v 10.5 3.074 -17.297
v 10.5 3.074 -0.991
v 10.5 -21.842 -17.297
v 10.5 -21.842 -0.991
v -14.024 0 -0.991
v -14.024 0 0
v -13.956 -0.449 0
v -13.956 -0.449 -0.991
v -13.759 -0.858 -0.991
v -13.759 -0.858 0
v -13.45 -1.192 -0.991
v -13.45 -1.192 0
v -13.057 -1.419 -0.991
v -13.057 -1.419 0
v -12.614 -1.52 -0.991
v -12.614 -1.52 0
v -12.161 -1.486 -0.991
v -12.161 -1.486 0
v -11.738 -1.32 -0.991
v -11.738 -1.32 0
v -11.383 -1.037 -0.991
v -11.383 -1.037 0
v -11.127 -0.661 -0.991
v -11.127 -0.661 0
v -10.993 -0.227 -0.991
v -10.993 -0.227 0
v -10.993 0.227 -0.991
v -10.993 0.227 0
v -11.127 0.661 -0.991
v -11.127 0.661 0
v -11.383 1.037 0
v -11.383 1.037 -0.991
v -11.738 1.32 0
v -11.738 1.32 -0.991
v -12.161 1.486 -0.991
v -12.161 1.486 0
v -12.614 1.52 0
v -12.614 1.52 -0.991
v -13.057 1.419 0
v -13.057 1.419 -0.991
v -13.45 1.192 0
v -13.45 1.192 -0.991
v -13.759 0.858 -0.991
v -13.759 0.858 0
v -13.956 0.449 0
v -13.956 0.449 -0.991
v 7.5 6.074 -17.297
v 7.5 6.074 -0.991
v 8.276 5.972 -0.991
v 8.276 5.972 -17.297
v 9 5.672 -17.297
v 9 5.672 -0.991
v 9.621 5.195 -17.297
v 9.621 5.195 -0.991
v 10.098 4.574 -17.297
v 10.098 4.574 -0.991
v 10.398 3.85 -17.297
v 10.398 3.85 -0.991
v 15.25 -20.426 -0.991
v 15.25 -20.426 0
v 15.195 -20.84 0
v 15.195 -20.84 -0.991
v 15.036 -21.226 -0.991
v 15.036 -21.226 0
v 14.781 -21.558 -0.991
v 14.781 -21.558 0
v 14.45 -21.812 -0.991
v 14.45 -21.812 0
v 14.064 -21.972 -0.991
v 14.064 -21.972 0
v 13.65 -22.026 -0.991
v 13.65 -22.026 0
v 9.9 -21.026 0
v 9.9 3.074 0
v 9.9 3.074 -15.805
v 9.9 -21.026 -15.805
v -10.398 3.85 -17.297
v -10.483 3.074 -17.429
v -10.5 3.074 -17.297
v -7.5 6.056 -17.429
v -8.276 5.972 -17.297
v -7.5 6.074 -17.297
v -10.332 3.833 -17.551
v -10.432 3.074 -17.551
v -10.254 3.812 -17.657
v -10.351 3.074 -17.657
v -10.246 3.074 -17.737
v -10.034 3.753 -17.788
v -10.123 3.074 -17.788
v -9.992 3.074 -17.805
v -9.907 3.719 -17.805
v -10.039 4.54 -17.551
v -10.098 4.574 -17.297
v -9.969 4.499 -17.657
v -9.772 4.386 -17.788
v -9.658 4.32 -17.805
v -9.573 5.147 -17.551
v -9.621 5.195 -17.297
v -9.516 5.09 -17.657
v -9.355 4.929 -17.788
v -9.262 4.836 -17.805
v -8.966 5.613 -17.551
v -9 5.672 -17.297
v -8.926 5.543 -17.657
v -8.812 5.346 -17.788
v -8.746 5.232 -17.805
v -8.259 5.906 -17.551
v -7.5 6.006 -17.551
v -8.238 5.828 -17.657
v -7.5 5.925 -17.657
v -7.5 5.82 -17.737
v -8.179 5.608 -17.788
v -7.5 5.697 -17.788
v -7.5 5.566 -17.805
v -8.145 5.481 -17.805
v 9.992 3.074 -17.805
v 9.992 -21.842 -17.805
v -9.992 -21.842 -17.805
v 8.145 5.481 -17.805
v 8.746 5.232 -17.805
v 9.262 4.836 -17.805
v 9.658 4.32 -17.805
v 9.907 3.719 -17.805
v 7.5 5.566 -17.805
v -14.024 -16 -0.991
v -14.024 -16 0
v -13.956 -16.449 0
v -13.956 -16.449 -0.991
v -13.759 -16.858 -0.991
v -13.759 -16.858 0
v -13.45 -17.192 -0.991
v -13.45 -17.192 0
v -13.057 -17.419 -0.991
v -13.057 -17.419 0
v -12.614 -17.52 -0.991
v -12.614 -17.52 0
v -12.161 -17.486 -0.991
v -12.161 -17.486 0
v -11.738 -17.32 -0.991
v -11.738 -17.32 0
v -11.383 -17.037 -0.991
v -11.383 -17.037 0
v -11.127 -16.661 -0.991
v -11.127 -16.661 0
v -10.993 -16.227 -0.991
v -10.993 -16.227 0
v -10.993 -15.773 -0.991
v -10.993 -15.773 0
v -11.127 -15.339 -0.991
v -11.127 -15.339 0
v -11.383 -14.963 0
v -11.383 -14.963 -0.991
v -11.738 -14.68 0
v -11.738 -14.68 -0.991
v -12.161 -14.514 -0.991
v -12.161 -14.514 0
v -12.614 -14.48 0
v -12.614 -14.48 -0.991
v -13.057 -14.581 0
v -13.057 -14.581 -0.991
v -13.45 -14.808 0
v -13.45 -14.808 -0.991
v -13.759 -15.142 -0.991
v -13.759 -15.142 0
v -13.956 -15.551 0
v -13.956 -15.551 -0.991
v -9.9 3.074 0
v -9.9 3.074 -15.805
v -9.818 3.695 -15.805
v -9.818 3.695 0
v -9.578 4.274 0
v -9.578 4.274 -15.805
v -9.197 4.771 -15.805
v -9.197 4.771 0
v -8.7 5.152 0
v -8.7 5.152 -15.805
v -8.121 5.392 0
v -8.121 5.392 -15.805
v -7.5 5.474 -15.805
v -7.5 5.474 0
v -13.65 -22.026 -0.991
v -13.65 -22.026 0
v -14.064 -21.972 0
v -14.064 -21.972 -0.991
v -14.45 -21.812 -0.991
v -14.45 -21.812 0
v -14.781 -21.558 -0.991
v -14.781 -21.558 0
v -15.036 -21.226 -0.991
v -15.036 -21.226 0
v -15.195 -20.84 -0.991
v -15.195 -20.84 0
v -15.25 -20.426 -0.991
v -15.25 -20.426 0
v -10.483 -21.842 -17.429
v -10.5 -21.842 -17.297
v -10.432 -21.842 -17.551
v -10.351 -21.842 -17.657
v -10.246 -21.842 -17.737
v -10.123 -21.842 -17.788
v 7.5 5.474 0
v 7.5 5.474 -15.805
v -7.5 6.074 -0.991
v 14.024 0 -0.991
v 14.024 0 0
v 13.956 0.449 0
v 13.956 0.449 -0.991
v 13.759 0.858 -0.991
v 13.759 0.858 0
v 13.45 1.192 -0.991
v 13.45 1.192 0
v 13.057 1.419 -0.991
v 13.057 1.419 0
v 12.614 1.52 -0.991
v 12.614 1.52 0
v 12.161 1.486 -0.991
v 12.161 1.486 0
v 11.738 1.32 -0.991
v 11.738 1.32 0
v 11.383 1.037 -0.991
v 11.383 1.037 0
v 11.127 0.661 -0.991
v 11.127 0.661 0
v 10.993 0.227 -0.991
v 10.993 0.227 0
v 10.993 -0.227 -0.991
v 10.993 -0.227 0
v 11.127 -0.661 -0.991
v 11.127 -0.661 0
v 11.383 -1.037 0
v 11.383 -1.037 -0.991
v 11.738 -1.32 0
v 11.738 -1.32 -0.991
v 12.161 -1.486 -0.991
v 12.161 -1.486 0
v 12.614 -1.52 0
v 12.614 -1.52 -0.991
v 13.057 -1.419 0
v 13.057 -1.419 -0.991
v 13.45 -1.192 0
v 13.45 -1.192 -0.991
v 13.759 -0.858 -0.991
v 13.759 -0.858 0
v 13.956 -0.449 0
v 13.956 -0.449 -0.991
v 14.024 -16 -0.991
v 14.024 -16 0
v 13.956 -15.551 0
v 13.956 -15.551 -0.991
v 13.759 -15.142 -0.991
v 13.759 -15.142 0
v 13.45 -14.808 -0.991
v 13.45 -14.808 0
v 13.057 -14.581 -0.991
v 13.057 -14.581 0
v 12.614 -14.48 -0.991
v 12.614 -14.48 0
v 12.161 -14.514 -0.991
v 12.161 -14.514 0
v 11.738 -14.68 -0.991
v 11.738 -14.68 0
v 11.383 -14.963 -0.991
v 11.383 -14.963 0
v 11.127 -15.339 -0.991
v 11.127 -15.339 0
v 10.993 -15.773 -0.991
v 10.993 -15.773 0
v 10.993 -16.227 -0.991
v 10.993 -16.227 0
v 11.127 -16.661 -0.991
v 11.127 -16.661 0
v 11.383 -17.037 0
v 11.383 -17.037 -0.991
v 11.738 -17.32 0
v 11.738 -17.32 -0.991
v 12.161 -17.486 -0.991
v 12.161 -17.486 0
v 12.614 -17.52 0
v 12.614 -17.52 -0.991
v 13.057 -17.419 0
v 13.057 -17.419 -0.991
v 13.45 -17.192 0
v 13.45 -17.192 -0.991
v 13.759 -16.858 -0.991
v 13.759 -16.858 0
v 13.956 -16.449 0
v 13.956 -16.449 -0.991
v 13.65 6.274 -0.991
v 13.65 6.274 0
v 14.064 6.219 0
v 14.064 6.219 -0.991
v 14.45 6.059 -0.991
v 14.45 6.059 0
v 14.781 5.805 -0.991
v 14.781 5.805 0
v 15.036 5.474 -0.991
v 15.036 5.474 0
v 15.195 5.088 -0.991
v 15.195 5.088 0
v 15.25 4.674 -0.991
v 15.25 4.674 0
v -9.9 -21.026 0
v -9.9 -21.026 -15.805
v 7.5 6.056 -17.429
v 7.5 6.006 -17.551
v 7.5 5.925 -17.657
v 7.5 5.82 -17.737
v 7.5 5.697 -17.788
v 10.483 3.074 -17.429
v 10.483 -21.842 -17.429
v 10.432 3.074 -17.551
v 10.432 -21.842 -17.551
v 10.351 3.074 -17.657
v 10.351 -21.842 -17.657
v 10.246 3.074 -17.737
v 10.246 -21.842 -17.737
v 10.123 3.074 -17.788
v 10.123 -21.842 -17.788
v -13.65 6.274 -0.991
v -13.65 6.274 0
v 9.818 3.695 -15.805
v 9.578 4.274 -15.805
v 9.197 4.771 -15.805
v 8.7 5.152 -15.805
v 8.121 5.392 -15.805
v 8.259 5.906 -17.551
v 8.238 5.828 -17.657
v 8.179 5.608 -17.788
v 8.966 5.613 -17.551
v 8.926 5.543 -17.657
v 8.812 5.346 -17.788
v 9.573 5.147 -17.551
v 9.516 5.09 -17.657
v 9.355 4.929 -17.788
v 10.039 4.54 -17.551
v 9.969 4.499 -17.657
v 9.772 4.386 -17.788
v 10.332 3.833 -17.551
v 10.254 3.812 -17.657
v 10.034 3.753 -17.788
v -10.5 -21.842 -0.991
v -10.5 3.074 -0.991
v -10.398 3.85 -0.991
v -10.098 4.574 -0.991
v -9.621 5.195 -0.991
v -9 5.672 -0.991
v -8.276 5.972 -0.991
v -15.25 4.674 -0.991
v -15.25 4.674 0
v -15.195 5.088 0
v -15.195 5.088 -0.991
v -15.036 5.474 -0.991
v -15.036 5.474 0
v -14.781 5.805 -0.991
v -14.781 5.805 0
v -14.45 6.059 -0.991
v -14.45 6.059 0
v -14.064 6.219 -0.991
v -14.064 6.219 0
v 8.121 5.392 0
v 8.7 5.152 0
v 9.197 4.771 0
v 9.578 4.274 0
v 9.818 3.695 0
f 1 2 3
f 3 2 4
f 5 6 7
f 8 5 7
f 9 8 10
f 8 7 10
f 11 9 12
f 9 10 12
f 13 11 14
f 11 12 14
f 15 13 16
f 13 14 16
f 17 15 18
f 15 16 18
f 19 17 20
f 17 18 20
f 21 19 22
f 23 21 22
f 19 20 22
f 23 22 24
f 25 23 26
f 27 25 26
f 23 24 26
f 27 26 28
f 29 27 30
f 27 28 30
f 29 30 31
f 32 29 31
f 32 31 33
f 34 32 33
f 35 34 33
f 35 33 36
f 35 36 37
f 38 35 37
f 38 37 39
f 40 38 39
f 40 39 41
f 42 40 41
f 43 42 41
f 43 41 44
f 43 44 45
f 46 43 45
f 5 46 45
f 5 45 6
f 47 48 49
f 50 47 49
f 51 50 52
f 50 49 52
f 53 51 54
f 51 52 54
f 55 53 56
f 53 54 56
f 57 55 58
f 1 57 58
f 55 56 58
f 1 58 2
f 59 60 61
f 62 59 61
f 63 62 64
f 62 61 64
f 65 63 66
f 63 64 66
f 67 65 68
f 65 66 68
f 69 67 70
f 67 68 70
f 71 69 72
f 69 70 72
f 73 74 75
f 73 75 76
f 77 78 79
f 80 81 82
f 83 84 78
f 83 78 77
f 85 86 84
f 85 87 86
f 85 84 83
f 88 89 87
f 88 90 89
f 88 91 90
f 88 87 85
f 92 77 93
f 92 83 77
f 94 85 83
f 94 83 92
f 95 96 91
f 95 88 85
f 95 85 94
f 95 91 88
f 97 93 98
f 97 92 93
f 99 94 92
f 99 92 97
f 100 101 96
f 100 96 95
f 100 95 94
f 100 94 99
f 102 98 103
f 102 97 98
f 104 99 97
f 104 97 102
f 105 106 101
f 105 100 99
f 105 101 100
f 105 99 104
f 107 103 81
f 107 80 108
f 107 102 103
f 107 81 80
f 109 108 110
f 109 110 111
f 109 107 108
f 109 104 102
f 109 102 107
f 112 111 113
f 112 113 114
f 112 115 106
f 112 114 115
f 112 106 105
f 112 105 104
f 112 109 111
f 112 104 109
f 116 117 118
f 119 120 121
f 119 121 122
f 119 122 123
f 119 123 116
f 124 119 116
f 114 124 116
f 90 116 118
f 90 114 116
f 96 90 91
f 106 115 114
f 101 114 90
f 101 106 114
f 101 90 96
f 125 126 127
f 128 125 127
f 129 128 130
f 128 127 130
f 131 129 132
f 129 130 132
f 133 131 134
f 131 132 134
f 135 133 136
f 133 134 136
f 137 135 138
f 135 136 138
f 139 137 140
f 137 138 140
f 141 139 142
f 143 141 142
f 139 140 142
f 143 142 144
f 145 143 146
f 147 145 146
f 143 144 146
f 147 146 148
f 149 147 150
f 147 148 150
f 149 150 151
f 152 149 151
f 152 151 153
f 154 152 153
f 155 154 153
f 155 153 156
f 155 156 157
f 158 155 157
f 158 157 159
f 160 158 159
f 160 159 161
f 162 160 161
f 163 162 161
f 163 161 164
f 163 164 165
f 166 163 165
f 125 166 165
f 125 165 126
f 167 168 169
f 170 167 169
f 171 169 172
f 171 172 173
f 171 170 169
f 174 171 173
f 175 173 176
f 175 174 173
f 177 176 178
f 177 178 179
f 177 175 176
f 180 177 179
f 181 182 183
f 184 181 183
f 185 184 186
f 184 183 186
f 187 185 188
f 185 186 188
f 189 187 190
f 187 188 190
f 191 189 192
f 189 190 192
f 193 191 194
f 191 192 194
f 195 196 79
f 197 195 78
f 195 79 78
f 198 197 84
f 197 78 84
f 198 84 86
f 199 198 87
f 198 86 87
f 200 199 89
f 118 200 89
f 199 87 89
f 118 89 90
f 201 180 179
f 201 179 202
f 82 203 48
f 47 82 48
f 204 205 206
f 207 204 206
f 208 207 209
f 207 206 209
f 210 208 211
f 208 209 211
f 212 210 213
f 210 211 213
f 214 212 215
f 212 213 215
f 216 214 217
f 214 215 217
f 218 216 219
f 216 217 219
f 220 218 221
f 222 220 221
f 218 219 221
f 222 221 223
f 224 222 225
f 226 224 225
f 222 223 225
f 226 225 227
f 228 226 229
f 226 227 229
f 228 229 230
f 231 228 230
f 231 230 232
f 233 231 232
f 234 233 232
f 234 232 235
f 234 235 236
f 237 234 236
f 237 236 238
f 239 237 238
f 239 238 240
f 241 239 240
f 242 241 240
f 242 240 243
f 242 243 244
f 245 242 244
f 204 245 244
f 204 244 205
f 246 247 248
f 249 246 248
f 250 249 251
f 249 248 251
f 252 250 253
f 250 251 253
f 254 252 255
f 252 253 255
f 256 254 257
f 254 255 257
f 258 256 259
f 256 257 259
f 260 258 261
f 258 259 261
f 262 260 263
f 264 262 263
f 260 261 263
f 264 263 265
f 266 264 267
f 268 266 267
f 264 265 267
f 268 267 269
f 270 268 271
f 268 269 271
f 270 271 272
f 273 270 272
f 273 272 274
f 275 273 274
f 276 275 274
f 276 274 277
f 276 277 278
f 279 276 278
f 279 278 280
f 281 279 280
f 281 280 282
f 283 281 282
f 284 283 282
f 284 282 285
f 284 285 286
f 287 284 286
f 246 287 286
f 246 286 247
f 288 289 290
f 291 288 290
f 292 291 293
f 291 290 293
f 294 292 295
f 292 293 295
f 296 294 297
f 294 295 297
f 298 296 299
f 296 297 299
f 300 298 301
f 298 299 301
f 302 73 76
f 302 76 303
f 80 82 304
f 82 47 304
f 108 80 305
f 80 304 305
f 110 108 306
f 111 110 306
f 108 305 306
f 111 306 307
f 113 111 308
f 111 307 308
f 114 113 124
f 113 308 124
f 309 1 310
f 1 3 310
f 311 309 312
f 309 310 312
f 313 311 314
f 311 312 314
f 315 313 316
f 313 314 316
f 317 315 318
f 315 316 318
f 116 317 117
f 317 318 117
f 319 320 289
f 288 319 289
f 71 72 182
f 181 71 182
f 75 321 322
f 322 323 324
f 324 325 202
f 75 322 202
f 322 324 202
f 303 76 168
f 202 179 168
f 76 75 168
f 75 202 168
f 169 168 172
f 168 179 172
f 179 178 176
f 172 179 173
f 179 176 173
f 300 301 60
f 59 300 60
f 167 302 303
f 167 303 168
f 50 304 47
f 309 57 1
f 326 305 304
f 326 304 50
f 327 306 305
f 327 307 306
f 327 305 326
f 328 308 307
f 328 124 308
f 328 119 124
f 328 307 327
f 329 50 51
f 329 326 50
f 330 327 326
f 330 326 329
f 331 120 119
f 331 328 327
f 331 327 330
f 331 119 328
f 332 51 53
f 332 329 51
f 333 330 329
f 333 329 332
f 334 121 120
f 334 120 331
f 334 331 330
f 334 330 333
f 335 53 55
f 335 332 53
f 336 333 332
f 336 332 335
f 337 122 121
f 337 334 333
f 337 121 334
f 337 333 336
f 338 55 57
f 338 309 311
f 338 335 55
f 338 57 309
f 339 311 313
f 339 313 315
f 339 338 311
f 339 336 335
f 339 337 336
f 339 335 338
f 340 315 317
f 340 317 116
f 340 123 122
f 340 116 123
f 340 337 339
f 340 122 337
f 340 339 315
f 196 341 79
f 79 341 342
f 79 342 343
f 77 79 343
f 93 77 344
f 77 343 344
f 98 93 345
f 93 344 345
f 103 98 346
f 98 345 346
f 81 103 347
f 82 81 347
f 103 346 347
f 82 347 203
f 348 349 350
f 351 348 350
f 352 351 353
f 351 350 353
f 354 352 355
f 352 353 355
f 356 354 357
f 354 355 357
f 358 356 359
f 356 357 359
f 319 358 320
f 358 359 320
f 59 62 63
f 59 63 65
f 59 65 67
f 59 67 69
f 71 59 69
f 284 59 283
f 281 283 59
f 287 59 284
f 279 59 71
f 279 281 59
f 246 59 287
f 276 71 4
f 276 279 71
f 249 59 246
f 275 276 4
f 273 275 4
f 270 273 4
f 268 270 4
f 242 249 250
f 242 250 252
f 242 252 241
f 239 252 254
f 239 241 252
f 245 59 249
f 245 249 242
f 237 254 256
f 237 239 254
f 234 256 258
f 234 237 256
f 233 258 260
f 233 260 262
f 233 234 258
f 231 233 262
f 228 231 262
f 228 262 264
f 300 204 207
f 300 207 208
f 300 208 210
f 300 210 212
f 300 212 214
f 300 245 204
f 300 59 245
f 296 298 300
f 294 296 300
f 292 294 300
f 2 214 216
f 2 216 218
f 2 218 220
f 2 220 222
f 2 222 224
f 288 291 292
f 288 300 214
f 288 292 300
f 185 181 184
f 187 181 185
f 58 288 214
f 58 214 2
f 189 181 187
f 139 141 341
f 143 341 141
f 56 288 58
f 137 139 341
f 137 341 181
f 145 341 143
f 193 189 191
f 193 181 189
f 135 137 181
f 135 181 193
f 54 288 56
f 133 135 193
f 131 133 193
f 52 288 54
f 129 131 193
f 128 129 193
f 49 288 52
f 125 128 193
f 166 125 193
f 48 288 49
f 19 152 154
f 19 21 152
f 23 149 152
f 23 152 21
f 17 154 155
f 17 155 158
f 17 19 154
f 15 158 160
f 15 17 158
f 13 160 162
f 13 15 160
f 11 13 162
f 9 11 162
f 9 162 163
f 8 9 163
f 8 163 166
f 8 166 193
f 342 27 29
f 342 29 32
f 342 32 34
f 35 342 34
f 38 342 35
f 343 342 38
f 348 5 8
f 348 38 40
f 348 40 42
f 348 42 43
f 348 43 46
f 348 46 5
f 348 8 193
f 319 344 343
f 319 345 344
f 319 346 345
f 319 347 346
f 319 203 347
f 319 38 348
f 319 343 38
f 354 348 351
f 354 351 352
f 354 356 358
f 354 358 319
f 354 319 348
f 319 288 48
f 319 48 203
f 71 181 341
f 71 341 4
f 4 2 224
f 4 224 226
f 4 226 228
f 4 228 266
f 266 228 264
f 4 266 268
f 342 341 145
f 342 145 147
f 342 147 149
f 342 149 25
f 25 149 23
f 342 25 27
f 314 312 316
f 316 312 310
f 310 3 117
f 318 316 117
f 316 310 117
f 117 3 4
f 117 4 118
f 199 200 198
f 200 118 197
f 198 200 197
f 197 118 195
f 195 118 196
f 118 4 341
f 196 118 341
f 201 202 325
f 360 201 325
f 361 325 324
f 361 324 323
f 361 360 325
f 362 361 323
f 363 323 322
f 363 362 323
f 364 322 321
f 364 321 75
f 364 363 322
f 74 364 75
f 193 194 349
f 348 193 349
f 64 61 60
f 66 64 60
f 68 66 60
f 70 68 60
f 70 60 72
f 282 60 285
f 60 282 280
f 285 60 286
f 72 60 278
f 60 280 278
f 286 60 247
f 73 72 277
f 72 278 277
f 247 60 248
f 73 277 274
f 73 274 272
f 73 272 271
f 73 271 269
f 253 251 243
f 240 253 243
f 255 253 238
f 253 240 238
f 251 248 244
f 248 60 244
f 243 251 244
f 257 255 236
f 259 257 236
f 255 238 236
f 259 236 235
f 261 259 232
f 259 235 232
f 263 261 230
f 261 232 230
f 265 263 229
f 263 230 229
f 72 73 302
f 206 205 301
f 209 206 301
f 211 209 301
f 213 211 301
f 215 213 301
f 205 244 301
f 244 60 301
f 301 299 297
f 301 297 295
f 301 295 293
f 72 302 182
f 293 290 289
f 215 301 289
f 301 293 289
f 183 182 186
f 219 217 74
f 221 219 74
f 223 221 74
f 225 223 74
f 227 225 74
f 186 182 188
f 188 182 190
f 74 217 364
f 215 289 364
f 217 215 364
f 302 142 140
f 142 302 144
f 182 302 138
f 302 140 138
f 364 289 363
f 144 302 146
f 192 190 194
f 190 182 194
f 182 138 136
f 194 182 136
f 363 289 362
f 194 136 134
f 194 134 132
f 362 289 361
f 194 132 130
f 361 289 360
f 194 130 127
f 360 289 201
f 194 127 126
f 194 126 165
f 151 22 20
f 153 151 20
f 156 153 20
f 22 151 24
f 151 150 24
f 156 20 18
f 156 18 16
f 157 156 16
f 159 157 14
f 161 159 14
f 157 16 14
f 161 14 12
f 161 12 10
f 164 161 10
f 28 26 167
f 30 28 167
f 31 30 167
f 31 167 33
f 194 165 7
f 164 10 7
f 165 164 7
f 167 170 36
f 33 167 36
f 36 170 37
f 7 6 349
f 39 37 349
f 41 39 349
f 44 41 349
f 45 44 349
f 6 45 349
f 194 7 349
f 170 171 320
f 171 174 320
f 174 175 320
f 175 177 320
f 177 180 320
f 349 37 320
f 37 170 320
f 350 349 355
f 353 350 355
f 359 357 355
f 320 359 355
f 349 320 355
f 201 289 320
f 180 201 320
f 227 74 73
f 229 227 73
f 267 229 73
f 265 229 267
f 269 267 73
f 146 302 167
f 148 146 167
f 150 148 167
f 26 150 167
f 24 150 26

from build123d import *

# Parameters (mm, degrees)
BASE_EXTRUDE_DEPTH  = 0.9906
SKETCH8_R           = 1.524
CUT_EXTRUDE4_DEPTH  = 27.808529889
BOSS_EXTRUDE5_DEPTH = 16.8148
FILLET3_R           = 0.508
CUT_EXTRUDE5_DEPTH  = 15.8054
LPATTERN1_COUNT     = 2
LPATTERN1_PITCH     = 16


with BuildPart() as part:
    # Sketch1 → Base-Extrude (new body)
    with BuildSketch(Plane.XY):
        with BuildLine():
            Line((-13.6498, 6.2738), (13.6498, 6.2738))
            ThreePointArc((13.6498, 6.2738), (14.781312271, 5.805112271), (15.25, 4.6736))
            Line((15.25, 4.6736), (15.25, -20.426))
            ThreePointArc((15.25, -20.426), (14.781312271, -21.557512271), (13.6498, -22.0262))
            Line((13.6498, -22.0262), (-13.6498, -22.0262))
            ThreePointArc((-13.6498, -22.0262), (-14.781312271, -21.557512271), (-15.25, -20.426))
            Line((-15.25, -20.426), (-15.25, 4.6736))
            ThreePointArc((-15.25, 4.6736), (-14.781312271, 5.805112271), (-13.6498, 6.2738))
        make_face()
    extrude(amount=-BASE_EXTRUDE_DEPTH)

    # Sketch8 → Cut-Extrude4 (cut, through all)
    with BuildSketch(Plane.XY):
        with Locations((12.5, 0)):
            Circle(SKETCH8_R)
        with Locations(Location((-12.5, 0, 0), (0, 0, 180))):
            Circle(SKETCH8_R)
    cut_extrude4 = extrude(amount=-CUT_EXTRUDE4_DEPTH, mode=Mode.SUBTRACT)

    # Sketch14 → Boss-Extrude5 (add)
    with BuildSketch(Plane(origin=(0, 0, -0.9906), x_dir=(-1, 0, 0), z_dir=(0, 0, -1))):
        with BuildLine():
            Line((-10.5, 3.0738), (-10.5, -21.841863832))
            Line((-10.5, -21.841863832), (10.5, -21.841863832))
            Line((10.5, -21.841863832), (10.5, 3.0738))
            ThreePointArc((10.5, 3.0738), (9.621320344, 5.195120344), (7.5, 6.0738))
            Line((7.5, 6.0738), (-7.5, 6.0738))
            ThreePointArc((-7.5, 6.0738), (-9.621320344, 5.195120344), (-10.5, 3.0738))
        make_face()
    extrude(amount=BOSS_EXTRUDE5_DEPTH)

    # Fillet3
    fillet3_edges = [part.edges().sort_by_distance(p)[0] for p in [
        (-9.621320344, 5.195120344, -17.8054),
        (9.621320344, 5.195120344, -17.8054),
        (-10.5, -9.384031916, -17.8054),
        (0, 6.0738, -17.8054),
        (10.5, -9.384031916, -17.8054),
    ]]
    fillet(fillet3_edges, radius=FILLET3_R)

    # Sketch15 → Cut-Extrude5 (cut)
    with BuildSketch(Plane.XY):
        with BuildLine():
            Line((9.9, -21.0262), (-9.9, -21.0262))
            Line((-9.9, -21.0262), (-9.9, 3.0738))
            ThreePointArc((-9.9, 3.0738), (-9.197056275, 4.770856275), (-7.5, 5.4738))
            Line((-7.5, 5.4738), (7.5, 5.4738))
            ThreePointArc((7.5, 5.4738), (9.197056275, 4.770856275), (9.9, 3.0738))
            Line((9.9, 3.0738), (9.9, -21.0262))
        make_face()
    extrude(amount=-CUT_EXTRUDE5_DEPTH, mode=Mode.SUBTRACT)

    # LPattern1: Cut-Extrude4 ×2
    with Locations(*[(0, -i * LPATTERN1_PITCH, 0) for i in range(1, LPATTERN1_COUNT)]):
        add(cut_extrude4, mode=Mode.SUBTRACT)


solid = part.part
